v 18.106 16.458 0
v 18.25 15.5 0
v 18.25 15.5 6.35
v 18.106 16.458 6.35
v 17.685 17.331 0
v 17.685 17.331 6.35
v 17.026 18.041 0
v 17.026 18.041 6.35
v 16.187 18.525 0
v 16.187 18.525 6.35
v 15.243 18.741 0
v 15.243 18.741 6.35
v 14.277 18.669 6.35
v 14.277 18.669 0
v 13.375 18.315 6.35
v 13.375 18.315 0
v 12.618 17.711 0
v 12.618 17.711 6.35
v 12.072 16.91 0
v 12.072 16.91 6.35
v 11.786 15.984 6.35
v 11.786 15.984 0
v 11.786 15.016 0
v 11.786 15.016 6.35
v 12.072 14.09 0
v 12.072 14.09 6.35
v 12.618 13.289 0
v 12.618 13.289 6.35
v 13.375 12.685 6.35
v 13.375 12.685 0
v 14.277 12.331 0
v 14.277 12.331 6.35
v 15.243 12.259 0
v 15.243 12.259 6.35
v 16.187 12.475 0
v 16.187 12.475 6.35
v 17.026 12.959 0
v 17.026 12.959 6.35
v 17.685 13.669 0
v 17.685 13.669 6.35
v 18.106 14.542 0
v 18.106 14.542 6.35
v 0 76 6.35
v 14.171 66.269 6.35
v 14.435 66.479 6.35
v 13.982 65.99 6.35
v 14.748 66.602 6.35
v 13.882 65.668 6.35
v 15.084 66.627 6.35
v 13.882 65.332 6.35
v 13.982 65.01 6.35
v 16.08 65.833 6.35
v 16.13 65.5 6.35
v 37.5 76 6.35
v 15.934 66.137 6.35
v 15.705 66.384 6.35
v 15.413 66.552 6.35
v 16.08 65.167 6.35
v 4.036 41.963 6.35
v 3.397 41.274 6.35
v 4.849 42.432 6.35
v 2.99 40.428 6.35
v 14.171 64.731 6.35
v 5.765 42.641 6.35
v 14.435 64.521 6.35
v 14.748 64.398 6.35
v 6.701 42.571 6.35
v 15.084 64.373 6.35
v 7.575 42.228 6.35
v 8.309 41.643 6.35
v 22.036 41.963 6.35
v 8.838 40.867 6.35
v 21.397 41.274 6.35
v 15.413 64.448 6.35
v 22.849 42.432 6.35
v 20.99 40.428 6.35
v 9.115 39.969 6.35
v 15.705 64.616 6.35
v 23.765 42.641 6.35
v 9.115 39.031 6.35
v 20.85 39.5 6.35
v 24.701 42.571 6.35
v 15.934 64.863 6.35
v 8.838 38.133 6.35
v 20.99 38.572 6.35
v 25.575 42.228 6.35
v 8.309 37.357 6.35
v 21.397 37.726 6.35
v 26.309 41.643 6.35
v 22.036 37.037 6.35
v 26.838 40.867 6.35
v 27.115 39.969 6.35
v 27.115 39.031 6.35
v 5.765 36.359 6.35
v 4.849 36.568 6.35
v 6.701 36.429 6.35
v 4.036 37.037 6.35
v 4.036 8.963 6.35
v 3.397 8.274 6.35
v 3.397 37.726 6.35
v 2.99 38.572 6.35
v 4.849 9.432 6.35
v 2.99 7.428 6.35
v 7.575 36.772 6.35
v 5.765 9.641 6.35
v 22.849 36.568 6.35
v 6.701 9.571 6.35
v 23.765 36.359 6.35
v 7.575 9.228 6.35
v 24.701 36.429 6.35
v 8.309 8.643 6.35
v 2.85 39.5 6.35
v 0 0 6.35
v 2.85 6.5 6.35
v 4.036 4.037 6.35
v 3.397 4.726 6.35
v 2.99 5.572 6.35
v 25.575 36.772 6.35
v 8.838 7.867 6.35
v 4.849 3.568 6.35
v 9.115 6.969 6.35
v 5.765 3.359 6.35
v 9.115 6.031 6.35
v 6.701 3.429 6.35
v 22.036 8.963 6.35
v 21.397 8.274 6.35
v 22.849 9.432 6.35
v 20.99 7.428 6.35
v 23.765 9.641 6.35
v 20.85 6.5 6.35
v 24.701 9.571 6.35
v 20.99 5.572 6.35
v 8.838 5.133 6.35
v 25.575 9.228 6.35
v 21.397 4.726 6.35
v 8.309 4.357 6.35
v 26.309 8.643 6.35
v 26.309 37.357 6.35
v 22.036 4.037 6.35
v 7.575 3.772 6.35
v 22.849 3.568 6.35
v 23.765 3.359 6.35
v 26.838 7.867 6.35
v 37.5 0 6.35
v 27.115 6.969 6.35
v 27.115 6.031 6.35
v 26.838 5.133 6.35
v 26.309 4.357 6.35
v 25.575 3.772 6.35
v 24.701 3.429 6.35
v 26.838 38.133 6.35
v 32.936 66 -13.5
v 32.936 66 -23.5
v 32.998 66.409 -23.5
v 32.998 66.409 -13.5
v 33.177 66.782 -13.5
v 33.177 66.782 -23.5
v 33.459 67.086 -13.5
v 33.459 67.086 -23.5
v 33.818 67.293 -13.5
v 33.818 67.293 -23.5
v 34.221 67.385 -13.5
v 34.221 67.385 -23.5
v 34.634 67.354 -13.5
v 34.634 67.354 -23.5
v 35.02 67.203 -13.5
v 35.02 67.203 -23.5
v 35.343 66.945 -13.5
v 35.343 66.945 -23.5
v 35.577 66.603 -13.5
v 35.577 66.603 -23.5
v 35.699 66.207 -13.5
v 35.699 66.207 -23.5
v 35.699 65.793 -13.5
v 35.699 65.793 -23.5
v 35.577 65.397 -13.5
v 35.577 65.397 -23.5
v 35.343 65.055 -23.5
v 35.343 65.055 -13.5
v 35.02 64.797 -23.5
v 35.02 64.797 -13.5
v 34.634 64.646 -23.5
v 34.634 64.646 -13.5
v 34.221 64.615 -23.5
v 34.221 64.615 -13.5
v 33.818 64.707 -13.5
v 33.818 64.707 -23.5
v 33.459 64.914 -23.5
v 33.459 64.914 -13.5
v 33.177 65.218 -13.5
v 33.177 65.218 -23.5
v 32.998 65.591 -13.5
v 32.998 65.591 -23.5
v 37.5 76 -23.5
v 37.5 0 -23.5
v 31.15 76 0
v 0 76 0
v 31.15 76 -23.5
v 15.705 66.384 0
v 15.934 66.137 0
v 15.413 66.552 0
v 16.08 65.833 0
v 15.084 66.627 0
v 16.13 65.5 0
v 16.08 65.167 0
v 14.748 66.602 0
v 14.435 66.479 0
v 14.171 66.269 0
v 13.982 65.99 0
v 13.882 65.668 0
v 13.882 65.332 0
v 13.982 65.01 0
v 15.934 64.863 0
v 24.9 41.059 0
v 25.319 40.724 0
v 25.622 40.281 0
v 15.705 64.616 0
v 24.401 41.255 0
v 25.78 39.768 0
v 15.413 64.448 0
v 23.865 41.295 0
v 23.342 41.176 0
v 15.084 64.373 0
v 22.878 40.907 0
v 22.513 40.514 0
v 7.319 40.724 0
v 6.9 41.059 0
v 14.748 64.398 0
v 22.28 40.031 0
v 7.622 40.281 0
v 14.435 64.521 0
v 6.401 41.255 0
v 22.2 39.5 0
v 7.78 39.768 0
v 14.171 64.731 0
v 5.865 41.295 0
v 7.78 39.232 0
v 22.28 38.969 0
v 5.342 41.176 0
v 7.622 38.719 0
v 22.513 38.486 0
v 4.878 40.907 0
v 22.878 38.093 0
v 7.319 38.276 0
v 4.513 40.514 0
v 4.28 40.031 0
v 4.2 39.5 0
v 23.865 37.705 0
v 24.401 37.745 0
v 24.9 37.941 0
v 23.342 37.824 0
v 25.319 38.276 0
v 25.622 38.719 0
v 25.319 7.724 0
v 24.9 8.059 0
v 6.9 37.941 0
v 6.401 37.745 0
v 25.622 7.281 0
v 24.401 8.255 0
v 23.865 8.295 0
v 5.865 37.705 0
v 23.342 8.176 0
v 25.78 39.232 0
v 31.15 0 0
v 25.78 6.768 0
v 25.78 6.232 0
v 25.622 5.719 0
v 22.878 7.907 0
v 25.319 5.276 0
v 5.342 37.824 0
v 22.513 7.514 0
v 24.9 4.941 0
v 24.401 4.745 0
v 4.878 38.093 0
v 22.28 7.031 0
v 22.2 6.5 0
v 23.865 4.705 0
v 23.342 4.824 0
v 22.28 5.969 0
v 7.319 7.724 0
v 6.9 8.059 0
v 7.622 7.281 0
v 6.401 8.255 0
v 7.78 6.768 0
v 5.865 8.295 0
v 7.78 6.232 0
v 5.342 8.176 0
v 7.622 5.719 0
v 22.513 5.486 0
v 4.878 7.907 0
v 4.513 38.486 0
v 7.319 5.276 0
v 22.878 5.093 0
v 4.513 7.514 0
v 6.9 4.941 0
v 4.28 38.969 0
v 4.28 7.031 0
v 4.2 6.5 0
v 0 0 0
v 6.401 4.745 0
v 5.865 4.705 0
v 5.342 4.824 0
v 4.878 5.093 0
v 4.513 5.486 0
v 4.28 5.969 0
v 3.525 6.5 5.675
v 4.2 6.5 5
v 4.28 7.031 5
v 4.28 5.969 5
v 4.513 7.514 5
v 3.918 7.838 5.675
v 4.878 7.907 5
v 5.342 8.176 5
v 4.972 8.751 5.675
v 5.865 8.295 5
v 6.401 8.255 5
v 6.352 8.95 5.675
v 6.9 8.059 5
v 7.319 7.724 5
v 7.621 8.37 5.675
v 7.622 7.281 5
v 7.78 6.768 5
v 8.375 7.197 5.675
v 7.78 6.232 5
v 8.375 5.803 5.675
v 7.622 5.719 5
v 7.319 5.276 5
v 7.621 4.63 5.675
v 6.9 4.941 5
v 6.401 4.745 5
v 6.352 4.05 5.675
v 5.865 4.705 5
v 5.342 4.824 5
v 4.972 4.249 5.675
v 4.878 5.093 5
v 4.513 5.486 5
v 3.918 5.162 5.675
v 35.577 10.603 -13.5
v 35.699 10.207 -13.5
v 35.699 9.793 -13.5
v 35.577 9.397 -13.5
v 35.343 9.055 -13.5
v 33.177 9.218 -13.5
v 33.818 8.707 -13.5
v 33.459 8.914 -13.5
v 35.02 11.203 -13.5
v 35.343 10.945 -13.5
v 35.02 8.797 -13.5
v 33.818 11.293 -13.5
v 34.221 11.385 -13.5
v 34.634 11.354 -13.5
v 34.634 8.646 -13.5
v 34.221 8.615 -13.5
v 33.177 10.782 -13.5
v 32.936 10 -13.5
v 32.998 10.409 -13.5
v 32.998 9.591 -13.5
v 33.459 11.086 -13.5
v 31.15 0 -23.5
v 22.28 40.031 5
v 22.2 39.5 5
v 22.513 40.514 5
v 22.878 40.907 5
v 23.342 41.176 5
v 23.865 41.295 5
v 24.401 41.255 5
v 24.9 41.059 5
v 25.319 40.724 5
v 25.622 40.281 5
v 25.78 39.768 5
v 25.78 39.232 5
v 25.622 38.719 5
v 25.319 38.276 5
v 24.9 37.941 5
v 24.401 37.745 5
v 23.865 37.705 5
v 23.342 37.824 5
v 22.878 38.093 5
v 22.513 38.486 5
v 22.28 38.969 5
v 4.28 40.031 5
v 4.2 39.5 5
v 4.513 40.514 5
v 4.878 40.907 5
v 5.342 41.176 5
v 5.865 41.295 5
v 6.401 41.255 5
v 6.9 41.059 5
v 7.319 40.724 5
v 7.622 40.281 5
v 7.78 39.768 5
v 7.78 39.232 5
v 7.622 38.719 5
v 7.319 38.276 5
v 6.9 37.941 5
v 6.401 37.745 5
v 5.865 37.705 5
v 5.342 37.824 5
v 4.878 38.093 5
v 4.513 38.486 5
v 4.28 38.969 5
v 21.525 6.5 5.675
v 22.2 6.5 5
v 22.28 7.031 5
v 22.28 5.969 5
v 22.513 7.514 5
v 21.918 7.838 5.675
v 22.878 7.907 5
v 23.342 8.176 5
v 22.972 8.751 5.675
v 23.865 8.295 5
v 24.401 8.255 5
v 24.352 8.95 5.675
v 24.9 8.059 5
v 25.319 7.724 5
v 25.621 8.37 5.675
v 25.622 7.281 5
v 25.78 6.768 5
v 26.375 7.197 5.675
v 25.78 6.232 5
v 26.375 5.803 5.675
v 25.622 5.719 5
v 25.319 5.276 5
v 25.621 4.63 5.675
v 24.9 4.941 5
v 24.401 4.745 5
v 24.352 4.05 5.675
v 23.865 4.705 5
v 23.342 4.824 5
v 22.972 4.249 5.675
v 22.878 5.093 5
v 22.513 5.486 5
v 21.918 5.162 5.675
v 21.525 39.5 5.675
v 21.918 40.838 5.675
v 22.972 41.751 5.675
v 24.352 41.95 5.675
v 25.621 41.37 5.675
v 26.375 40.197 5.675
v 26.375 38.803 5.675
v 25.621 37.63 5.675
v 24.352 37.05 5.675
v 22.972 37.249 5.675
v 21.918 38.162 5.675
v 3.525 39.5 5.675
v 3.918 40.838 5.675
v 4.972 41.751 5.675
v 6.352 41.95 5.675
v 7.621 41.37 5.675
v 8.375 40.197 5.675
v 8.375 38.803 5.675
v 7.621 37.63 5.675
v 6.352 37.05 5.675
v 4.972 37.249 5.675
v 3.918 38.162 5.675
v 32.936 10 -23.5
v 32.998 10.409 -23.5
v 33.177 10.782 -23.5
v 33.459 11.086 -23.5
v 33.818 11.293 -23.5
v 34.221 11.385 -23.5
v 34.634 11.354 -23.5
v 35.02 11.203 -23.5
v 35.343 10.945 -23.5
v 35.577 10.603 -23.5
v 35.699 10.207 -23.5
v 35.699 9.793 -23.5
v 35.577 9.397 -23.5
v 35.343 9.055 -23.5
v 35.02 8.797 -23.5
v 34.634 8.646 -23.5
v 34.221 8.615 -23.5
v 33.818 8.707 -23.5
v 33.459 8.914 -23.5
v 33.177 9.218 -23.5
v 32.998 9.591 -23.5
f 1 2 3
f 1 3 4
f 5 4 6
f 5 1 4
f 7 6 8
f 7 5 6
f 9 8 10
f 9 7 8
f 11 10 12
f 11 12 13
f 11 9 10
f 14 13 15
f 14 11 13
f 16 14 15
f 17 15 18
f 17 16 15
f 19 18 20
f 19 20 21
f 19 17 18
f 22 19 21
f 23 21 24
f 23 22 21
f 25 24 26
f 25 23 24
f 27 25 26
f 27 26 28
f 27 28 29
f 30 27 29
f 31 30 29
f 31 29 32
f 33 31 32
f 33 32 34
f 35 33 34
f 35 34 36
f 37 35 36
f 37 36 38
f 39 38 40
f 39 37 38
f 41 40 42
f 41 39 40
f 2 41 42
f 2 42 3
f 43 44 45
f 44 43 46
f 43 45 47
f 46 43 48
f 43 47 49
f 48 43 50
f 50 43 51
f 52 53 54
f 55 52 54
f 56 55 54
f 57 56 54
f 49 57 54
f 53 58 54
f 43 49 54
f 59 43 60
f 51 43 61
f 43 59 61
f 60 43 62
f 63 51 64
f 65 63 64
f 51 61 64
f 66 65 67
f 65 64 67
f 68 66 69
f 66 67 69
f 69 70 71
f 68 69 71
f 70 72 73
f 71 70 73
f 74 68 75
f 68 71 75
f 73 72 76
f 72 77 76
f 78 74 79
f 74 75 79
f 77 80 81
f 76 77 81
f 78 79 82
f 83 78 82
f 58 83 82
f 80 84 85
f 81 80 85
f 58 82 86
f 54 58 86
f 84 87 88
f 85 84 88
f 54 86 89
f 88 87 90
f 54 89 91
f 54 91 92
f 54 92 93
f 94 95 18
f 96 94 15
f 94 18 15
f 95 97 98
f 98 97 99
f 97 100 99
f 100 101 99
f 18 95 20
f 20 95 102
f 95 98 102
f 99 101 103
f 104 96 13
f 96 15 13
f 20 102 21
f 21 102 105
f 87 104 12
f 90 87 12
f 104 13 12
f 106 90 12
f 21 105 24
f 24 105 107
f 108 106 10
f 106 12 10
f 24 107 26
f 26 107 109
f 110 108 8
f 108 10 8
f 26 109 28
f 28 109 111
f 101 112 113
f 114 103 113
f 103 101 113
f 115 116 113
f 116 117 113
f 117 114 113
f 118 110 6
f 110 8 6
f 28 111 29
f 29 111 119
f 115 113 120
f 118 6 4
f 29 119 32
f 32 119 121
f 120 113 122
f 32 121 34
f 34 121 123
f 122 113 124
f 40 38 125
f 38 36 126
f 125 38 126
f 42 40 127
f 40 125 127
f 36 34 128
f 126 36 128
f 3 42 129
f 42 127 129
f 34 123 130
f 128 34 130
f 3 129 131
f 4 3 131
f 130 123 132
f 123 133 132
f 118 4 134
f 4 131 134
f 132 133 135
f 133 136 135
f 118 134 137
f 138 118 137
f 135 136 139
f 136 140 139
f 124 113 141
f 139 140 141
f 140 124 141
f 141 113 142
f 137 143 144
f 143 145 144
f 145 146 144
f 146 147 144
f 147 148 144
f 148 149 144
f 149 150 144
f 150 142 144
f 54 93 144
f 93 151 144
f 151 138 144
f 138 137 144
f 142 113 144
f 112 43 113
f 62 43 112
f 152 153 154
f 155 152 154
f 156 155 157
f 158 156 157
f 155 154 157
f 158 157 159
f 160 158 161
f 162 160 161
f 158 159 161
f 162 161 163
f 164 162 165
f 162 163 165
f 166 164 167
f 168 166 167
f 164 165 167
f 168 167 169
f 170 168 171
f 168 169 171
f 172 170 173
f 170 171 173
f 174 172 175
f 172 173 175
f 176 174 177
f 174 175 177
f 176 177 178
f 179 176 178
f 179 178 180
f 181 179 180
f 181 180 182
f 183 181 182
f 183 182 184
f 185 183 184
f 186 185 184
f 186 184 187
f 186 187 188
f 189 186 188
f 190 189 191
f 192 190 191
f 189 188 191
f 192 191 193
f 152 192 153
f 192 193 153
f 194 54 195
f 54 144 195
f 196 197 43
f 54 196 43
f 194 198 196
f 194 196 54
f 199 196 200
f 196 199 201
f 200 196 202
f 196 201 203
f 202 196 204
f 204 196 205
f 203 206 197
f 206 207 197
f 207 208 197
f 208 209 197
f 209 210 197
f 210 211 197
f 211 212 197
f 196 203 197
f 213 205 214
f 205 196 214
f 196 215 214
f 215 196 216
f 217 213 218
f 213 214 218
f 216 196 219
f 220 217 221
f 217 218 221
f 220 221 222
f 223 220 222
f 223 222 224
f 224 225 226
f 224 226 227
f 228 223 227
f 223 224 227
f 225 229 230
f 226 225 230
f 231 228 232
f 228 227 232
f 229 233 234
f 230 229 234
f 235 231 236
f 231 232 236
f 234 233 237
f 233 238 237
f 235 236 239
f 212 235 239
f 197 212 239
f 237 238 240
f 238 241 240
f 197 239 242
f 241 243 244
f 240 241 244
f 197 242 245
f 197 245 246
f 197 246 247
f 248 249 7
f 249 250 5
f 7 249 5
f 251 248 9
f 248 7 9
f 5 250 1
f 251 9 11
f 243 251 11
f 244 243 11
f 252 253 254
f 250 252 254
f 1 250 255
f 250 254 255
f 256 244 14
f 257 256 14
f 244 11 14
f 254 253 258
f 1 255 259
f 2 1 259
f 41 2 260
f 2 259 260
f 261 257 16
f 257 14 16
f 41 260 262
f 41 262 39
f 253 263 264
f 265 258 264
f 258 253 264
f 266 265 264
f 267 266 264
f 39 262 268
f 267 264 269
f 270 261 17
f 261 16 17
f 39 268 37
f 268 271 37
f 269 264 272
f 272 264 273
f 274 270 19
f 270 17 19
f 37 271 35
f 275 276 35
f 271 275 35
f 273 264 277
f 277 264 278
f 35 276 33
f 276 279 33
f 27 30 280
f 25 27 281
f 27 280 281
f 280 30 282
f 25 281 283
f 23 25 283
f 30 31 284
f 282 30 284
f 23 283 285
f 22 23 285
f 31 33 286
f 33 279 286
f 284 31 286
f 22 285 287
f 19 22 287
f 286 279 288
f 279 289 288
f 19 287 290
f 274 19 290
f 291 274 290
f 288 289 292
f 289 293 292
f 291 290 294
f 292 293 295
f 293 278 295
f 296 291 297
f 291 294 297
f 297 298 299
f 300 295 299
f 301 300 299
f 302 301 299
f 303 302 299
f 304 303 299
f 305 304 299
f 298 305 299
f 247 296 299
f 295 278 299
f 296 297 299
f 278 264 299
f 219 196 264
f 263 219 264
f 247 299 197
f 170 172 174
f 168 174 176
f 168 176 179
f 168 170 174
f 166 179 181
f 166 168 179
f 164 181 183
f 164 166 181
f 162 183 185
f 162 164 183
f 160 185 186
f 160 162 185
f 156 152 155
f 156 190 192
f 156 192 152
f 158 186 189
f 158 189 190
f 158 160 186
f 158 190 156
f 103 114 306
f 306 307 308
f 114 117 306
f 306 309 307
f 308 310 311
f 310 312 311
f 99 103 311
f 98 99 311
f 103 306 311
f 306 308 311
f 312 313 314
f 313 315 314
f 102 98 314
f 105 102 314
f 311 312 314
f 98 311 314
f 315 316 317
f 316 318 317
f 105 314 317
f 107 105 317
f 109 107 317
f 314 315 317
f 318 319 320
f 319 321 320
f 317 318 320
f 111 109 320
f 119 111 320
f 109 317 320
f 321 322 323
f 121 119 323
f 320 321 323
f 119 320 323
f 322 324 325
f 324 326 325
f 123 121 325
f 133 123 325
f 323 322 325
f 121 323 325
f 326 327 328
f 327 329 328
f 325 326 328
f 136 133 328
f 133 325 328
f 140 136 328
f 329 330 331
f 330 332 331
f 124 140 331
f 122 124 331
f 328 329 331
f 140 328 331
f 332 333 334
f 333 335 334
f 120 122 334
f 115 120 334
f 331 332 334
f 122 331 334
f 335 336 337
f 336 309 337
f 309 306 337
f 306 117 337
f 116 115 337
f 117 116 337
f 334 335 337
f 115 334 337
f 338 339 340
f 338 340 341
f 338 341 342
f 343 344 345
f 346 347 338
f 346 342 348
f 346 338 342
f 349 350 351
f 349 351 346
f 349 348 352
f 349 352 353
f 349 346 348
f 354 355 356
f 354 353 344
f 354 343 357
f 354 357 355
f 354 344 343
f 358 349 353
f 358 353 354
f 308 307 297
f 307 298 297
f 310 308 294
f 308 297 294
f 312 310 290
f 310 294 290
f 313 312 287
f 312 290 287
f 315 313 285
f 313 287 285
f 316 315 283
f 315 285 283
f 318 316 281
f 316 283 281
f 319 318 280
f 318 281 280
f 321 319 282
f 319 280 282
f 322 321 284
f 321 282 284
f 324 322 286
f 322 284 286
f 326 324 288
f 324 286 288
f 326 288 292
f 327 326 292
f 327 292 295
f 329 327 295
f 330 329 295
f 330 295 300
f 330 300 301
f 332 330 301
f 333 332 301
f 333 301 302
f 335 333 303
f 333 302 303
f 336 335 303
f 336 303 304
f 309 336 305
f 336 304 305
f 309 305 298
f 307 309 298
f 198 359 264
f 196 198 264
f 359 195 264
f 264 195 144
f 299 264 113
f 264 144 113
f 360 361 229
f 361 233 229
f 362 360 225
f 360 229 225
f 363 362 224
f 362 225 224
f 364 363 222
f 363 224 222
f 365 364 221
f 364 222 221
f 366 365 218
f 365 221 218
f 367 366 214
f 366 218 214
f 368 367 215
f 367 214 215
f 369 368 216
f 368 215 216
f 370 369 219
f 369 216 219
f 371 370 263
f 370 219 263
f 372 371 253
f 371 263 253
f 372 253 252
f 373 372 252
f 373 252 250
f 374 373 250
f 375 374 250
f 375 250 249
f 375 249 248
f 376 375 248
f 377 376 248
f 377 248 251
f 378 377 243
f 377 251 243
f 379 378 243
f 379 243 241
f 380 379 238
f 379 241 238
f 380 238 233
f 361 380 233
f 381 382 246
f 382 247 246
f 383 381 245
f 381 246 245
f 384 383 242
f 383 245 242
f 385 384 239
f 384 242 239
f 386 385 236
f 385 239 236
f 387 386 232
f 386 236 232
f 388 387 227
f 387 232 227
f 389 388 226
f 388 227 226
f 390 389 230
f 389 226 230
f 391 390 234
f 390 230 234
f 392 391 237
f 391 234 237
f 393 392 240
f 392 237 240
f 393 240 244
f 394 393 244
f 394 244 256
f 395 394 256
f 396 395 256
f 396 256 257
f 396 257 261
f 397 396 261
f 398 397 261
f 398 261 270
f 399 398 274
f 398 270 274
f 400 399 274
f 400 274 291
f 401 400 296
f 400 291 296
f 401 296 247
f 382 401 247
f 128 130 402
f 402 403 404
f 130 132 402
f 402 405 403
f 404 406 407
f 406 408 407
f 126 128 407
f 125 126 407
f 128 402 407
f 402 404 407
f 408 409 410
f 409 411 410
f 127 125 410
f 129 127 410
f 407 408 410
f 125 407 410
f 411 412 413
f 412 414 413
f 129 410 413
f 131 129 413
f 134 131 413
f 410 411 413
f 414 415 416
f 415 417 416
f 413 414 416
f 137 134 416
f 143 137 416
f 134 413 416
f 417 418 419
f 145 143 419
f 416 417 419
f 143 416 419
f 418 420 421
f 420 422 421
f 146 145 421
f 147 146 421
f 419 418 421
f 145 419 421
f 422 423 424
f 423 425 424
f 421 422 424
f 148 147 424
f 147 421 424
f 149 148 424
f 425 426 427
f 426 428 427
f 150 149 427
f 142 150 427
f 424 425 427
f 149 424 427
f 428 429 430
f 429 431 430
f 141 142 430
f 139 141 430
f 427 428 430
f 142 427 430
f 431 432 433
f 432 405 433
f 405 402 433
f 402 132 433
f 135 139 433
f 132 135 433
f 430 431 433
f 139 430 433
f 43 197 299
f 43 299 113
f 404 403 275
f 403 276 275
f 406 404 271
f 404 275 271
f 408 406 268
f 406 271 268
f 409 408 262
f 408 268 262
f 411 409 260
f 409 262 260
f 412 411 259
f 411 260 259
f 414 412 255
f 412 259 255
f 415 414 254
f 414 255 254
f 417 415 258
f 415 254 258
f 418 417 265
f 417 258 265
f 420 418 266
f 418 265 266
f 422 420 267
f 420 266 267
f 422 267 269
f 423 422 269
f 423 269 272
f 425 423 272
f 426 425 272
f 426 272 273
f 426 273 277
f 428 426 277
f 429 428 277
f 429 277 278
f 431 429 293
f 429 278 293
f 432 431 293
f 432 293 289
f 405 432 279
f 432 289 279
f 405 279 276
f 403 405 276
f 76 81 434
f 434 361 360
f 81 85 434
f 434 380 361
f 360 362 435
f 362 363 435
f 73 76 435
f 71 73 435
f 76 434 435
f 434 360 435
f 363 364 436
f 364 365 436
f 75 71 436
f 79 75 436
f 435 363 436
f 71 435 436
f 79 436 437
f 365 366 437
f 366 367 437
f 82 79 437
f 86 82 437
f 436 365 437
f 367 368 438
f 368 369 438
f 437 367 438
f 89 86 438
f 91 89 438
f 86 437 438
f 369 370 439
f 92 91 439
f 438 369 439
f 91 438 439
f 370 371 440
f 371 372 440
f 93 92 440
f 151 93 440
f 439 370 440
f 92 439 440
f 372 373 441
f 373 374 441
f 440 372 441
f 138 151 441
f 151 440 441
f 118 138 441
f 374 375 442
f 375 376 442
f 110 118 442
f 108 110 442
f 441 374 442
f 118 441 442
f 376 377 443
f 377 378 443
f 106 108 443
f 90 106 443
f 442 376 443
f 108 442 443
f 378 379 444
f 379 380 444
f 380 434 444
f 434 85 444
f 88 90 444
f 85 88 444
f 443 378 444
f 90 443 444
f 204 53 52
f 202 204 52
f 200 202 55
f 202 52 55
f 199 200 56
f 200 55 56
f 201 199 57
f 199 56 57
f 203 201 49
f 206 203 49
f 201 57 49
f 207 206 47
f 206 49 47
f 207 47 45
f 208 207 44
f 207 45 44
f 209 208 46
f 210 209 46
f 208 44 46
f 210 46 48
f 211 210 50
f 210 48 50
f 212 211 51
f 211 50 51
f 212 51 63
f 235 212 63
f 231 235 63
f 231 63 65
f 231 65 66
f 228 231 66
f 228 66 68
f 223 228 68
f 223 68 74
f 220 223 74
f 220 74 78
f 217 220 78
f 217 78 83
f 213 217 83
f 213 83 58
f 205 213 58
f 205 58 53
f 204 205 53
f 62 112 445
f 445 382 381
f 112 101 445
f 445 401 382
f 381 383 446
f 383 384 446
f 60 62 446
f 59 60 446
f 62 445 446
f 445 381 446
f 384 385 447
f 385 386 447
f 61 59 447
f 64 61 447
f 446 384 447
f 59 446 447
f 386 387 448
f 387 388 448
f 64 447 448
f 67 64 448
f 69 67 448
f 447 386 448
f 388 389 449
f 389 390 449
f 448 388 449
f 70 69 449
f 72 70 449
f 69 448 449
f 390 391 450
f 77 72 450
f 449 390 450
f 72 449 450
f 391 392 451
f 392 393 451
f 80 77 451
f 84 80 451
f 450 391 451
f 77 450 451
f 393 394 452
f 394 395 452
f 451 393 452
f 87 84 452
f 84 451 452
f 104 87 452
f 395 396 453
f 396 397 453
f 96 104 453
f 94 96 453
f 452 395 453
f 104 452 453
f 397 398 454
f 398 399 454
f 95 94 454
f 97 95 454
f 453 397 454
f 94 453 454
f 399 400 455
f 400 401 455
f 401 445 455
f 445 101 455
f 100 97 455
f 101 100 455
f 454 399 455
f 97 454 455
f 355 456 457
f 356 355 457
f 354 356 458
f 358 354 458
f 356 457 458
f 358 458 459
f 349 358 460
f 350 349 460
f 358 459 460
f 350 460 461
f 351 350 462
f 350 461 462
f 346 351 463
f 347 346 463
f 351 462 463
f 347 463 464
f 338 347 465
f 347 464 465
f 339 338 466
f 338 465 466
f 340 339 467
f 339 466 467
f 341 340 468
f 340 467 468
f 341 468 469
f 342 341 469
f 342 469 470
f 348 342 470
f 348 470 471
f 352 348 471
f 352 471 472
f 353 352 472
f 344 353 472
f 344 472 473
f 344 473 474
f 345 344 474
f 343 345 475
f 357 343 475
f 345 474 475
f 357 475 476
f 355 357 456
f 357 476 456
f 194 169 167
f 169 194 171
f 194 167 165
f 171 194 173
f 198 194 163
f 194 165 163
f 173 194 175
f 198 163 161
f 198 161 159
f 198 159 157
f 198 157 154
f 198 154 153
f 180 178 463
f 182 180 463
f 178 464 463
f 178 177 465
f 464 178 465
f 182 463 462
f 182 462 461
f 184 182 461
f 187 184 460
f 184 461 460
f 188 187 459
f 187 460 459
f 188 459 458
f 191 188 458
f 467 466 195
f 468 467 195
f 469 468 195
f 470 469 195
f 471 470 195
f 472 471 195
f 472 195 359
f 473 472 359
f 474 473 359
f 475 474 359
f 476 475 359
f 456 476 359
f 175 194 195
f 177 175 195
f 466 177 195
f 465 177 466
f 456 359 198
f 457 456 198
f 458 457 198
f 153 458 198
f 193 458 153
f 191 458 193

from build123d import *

# Parameters (mm, degrees)
SKETCH1_W                                       = 37.5
SKETCH1_H                                       = 46
SKETCH1_R                                       = 6.25
SKETCH1_R_2                                     = 3.5
SKETCH1_R_3                                     = 3.25
SKETCH1_R_4                                     = 1.7
BOSS_EXTRUDE1_DEPTH                             = 6.35
CSK_FOR_M3_FLAT_HEAD_MACHINE_SCREW1_D           = 3.6
CSK_FOR_M3_FLAT_HEAD_MACHINE_SCREW1_CSINK_D     = 6.3
CSK_FOR_M3_FLAT_HEAD_MACHINE_SCREW1_CSINK_ANGLE = 90
SKETCH3_W                                       = 6.35
SKETCH3_H                                       = 46
BOSS_EXTRUDE2_DEPTH                             = 23.5
BOSS_EXTRUDE4_DEPTH                             = 30
CUT_EXTRUDE1_REACH                              = 91.851
SKETCH6_R                                       = 1.1303
SKETCH7_R                                       = 1.3890625
CUT_EXTRUDE2_DEPTH                              = 10


with BuildPart() as part:
    # Sketch1 → Boss-Extrude1 (new body)
    # profile 1 of 6: a face of its own
    with BuildSketch(Plane.XY):
        with Locations((18.75, 23)):
            Rectangle(SKETCH1_W, SKETCH1_H)
        with Locations((15, 15.5)):
            Circle(SKETCH1_R, mode=Mode.SUBTRACT)
        with Locations((24, 6.5)):
            Circle(SKETCH1_R_2, mode=Mode.SUBTRACT)
        with Locations((6, 6.5)):
            Circle(SKETCH1_R_2, mode=Mode.SUBTRACT)
        with Locations((6, 39.5)):
            Circle(SKETCH1_R_2, mode=Mode.SUBTRACT)
        with Locations((24, 39.5)):
            Circle(SKETCH1_R_2, mode=Mode.SUBTRACT)
    # profile 2 of 6: a face of its own
    with BuildSketch(Plane.XY):
        with Locations((15, 15.5)):
            Circle(SKETCH1_R)
        with Locations((15, 15.5)):
            Circle(SKETCH1_R_3, mode=Mode.SUBTRACT)
    # profile 3 of 6: a face of its own
    with BuildSketch(Plane.XY):
        with Locations((6, 39.5)):
            Circle(SKETCH1_R_2)
        with Locations((6, 39.5)):
            Circle(SKETCH1_R_4, mode=Mode.SUBTRACT)
    # profile 4 of 6: a face of its own
    with BuildSketch(Plane.XY):
        with Locations((24, 39.5)):
            Circle(SKETCH1_R_2)
        with Locations((24, 39.5)):
            Circle(SKETCH1_R_4, mode=Mode.SUBTRACT)
    # profile 5 of 6: a face of its own
    with BuildSketch(Plane.XY):
        with Locations((24, 6.5)):
            Circle(SKETCH1_R_2)
        with Locations((24, 6.5)):
            Circle(SKETCH1_R_4, mode=Mode.SUBTRACT)
    # profile 6 of 6: a face of its own
    with BuildSketch(Plane.XY):
        with Locations((6, 6.5)):
            Circle(SKETCH1_R_2)
        with Locations((6, 6.5)):
            Circle(SKETCH1_R_4, mode=Mode.SUBTRACT)
    extrude(amount=BOSS_EXTRUDE1_DEPTH)

    # CSK for M3 Flat Head Machine Screw1 (through all)
    with Locations(Plane(origin=(6, 6.5, 6.35), x_dir=(1, 0, 0), z_dir=(0, 0, 1))):
        with Locations((0, 0), (0, 33), (18, 33), (18, 0)):
            CounterSinkHole(CSK_FOR_M3_FLAT_HEAD_MACHINE_SCREW1_D / 2, CSK_FOR_M3_FLAT_HEAD_MACHINE_SCREW1_CSINK_D / 2, counter_sink_angle=CSK_FOR_M3_FLAT_HEAD_MACHINE_SCREW1_CSINK_ANGLE)

    # Sketch3 → Boss-Extrude2 (add)
    with BuildSketch(Plane(origin=(0, 0, 0), x_dir=(-1, 0, 0), z_dir=(0, 0, -1))):
        with Locations((-34.325, 23)):
            Rectangle(SKETCH3_W, SKETCH3_H)
    extrude(amount=BOSS_EXTRUDE2_DEPTH)

    # Sketch5 → Boss-Extrude4 (add)
    with BuildSketch(Plane(origin=(0, 46, 0), x_dir=(1, 0, 0), z_dir=(0, 1, 0))):
        Polygon((31.15, 0), (0, 0), (0, -6.35), (37.5, -6.35), (37.5, 23.5), (31.15, 23.5), align=None)
    extrude(amount=BOSS_EXTRUDE4_DEPTH)

    # Sketch6 → Cut-Extrude1 (cut, up to next)
    with BuildSketch(Plane.XY.offset(6.35), mode=Mode.PRIVATE) as cut_extrude1_sk1:
        with Locations((15, 65.5)):
            Circle(SKETCH6_R)
    cut_extrude1_tool1 = extrude(cut_extrude1_sk1.sketch, amount=-CUT_EXTRUDE1_REACH, mode=Mode.PRIVATE) & part.part
    add(cut_extrude1_tool1.solids().sort_by_distance((15, 65.5, 6.35))[0], mode=Mode.SUBTRACT)

    # Sketch7 → Cut-Extrude2 (cut)
    with BuildSketch(Plane(origin=(0, 0, -23.5), x_dir=(-1, 0, 0), z_dir=(0, 0, -1))):
        with Locations((-34.325, 10)):
            Circle(SKETCH7_R)
        with Locations((-34.325, 66)):
            Circle(SKETCH7_R)
    extrude(amount=-CUT_EXTRUDE2_DEPTH, mode=Mode.SUBTRACT)


solid = part.part
